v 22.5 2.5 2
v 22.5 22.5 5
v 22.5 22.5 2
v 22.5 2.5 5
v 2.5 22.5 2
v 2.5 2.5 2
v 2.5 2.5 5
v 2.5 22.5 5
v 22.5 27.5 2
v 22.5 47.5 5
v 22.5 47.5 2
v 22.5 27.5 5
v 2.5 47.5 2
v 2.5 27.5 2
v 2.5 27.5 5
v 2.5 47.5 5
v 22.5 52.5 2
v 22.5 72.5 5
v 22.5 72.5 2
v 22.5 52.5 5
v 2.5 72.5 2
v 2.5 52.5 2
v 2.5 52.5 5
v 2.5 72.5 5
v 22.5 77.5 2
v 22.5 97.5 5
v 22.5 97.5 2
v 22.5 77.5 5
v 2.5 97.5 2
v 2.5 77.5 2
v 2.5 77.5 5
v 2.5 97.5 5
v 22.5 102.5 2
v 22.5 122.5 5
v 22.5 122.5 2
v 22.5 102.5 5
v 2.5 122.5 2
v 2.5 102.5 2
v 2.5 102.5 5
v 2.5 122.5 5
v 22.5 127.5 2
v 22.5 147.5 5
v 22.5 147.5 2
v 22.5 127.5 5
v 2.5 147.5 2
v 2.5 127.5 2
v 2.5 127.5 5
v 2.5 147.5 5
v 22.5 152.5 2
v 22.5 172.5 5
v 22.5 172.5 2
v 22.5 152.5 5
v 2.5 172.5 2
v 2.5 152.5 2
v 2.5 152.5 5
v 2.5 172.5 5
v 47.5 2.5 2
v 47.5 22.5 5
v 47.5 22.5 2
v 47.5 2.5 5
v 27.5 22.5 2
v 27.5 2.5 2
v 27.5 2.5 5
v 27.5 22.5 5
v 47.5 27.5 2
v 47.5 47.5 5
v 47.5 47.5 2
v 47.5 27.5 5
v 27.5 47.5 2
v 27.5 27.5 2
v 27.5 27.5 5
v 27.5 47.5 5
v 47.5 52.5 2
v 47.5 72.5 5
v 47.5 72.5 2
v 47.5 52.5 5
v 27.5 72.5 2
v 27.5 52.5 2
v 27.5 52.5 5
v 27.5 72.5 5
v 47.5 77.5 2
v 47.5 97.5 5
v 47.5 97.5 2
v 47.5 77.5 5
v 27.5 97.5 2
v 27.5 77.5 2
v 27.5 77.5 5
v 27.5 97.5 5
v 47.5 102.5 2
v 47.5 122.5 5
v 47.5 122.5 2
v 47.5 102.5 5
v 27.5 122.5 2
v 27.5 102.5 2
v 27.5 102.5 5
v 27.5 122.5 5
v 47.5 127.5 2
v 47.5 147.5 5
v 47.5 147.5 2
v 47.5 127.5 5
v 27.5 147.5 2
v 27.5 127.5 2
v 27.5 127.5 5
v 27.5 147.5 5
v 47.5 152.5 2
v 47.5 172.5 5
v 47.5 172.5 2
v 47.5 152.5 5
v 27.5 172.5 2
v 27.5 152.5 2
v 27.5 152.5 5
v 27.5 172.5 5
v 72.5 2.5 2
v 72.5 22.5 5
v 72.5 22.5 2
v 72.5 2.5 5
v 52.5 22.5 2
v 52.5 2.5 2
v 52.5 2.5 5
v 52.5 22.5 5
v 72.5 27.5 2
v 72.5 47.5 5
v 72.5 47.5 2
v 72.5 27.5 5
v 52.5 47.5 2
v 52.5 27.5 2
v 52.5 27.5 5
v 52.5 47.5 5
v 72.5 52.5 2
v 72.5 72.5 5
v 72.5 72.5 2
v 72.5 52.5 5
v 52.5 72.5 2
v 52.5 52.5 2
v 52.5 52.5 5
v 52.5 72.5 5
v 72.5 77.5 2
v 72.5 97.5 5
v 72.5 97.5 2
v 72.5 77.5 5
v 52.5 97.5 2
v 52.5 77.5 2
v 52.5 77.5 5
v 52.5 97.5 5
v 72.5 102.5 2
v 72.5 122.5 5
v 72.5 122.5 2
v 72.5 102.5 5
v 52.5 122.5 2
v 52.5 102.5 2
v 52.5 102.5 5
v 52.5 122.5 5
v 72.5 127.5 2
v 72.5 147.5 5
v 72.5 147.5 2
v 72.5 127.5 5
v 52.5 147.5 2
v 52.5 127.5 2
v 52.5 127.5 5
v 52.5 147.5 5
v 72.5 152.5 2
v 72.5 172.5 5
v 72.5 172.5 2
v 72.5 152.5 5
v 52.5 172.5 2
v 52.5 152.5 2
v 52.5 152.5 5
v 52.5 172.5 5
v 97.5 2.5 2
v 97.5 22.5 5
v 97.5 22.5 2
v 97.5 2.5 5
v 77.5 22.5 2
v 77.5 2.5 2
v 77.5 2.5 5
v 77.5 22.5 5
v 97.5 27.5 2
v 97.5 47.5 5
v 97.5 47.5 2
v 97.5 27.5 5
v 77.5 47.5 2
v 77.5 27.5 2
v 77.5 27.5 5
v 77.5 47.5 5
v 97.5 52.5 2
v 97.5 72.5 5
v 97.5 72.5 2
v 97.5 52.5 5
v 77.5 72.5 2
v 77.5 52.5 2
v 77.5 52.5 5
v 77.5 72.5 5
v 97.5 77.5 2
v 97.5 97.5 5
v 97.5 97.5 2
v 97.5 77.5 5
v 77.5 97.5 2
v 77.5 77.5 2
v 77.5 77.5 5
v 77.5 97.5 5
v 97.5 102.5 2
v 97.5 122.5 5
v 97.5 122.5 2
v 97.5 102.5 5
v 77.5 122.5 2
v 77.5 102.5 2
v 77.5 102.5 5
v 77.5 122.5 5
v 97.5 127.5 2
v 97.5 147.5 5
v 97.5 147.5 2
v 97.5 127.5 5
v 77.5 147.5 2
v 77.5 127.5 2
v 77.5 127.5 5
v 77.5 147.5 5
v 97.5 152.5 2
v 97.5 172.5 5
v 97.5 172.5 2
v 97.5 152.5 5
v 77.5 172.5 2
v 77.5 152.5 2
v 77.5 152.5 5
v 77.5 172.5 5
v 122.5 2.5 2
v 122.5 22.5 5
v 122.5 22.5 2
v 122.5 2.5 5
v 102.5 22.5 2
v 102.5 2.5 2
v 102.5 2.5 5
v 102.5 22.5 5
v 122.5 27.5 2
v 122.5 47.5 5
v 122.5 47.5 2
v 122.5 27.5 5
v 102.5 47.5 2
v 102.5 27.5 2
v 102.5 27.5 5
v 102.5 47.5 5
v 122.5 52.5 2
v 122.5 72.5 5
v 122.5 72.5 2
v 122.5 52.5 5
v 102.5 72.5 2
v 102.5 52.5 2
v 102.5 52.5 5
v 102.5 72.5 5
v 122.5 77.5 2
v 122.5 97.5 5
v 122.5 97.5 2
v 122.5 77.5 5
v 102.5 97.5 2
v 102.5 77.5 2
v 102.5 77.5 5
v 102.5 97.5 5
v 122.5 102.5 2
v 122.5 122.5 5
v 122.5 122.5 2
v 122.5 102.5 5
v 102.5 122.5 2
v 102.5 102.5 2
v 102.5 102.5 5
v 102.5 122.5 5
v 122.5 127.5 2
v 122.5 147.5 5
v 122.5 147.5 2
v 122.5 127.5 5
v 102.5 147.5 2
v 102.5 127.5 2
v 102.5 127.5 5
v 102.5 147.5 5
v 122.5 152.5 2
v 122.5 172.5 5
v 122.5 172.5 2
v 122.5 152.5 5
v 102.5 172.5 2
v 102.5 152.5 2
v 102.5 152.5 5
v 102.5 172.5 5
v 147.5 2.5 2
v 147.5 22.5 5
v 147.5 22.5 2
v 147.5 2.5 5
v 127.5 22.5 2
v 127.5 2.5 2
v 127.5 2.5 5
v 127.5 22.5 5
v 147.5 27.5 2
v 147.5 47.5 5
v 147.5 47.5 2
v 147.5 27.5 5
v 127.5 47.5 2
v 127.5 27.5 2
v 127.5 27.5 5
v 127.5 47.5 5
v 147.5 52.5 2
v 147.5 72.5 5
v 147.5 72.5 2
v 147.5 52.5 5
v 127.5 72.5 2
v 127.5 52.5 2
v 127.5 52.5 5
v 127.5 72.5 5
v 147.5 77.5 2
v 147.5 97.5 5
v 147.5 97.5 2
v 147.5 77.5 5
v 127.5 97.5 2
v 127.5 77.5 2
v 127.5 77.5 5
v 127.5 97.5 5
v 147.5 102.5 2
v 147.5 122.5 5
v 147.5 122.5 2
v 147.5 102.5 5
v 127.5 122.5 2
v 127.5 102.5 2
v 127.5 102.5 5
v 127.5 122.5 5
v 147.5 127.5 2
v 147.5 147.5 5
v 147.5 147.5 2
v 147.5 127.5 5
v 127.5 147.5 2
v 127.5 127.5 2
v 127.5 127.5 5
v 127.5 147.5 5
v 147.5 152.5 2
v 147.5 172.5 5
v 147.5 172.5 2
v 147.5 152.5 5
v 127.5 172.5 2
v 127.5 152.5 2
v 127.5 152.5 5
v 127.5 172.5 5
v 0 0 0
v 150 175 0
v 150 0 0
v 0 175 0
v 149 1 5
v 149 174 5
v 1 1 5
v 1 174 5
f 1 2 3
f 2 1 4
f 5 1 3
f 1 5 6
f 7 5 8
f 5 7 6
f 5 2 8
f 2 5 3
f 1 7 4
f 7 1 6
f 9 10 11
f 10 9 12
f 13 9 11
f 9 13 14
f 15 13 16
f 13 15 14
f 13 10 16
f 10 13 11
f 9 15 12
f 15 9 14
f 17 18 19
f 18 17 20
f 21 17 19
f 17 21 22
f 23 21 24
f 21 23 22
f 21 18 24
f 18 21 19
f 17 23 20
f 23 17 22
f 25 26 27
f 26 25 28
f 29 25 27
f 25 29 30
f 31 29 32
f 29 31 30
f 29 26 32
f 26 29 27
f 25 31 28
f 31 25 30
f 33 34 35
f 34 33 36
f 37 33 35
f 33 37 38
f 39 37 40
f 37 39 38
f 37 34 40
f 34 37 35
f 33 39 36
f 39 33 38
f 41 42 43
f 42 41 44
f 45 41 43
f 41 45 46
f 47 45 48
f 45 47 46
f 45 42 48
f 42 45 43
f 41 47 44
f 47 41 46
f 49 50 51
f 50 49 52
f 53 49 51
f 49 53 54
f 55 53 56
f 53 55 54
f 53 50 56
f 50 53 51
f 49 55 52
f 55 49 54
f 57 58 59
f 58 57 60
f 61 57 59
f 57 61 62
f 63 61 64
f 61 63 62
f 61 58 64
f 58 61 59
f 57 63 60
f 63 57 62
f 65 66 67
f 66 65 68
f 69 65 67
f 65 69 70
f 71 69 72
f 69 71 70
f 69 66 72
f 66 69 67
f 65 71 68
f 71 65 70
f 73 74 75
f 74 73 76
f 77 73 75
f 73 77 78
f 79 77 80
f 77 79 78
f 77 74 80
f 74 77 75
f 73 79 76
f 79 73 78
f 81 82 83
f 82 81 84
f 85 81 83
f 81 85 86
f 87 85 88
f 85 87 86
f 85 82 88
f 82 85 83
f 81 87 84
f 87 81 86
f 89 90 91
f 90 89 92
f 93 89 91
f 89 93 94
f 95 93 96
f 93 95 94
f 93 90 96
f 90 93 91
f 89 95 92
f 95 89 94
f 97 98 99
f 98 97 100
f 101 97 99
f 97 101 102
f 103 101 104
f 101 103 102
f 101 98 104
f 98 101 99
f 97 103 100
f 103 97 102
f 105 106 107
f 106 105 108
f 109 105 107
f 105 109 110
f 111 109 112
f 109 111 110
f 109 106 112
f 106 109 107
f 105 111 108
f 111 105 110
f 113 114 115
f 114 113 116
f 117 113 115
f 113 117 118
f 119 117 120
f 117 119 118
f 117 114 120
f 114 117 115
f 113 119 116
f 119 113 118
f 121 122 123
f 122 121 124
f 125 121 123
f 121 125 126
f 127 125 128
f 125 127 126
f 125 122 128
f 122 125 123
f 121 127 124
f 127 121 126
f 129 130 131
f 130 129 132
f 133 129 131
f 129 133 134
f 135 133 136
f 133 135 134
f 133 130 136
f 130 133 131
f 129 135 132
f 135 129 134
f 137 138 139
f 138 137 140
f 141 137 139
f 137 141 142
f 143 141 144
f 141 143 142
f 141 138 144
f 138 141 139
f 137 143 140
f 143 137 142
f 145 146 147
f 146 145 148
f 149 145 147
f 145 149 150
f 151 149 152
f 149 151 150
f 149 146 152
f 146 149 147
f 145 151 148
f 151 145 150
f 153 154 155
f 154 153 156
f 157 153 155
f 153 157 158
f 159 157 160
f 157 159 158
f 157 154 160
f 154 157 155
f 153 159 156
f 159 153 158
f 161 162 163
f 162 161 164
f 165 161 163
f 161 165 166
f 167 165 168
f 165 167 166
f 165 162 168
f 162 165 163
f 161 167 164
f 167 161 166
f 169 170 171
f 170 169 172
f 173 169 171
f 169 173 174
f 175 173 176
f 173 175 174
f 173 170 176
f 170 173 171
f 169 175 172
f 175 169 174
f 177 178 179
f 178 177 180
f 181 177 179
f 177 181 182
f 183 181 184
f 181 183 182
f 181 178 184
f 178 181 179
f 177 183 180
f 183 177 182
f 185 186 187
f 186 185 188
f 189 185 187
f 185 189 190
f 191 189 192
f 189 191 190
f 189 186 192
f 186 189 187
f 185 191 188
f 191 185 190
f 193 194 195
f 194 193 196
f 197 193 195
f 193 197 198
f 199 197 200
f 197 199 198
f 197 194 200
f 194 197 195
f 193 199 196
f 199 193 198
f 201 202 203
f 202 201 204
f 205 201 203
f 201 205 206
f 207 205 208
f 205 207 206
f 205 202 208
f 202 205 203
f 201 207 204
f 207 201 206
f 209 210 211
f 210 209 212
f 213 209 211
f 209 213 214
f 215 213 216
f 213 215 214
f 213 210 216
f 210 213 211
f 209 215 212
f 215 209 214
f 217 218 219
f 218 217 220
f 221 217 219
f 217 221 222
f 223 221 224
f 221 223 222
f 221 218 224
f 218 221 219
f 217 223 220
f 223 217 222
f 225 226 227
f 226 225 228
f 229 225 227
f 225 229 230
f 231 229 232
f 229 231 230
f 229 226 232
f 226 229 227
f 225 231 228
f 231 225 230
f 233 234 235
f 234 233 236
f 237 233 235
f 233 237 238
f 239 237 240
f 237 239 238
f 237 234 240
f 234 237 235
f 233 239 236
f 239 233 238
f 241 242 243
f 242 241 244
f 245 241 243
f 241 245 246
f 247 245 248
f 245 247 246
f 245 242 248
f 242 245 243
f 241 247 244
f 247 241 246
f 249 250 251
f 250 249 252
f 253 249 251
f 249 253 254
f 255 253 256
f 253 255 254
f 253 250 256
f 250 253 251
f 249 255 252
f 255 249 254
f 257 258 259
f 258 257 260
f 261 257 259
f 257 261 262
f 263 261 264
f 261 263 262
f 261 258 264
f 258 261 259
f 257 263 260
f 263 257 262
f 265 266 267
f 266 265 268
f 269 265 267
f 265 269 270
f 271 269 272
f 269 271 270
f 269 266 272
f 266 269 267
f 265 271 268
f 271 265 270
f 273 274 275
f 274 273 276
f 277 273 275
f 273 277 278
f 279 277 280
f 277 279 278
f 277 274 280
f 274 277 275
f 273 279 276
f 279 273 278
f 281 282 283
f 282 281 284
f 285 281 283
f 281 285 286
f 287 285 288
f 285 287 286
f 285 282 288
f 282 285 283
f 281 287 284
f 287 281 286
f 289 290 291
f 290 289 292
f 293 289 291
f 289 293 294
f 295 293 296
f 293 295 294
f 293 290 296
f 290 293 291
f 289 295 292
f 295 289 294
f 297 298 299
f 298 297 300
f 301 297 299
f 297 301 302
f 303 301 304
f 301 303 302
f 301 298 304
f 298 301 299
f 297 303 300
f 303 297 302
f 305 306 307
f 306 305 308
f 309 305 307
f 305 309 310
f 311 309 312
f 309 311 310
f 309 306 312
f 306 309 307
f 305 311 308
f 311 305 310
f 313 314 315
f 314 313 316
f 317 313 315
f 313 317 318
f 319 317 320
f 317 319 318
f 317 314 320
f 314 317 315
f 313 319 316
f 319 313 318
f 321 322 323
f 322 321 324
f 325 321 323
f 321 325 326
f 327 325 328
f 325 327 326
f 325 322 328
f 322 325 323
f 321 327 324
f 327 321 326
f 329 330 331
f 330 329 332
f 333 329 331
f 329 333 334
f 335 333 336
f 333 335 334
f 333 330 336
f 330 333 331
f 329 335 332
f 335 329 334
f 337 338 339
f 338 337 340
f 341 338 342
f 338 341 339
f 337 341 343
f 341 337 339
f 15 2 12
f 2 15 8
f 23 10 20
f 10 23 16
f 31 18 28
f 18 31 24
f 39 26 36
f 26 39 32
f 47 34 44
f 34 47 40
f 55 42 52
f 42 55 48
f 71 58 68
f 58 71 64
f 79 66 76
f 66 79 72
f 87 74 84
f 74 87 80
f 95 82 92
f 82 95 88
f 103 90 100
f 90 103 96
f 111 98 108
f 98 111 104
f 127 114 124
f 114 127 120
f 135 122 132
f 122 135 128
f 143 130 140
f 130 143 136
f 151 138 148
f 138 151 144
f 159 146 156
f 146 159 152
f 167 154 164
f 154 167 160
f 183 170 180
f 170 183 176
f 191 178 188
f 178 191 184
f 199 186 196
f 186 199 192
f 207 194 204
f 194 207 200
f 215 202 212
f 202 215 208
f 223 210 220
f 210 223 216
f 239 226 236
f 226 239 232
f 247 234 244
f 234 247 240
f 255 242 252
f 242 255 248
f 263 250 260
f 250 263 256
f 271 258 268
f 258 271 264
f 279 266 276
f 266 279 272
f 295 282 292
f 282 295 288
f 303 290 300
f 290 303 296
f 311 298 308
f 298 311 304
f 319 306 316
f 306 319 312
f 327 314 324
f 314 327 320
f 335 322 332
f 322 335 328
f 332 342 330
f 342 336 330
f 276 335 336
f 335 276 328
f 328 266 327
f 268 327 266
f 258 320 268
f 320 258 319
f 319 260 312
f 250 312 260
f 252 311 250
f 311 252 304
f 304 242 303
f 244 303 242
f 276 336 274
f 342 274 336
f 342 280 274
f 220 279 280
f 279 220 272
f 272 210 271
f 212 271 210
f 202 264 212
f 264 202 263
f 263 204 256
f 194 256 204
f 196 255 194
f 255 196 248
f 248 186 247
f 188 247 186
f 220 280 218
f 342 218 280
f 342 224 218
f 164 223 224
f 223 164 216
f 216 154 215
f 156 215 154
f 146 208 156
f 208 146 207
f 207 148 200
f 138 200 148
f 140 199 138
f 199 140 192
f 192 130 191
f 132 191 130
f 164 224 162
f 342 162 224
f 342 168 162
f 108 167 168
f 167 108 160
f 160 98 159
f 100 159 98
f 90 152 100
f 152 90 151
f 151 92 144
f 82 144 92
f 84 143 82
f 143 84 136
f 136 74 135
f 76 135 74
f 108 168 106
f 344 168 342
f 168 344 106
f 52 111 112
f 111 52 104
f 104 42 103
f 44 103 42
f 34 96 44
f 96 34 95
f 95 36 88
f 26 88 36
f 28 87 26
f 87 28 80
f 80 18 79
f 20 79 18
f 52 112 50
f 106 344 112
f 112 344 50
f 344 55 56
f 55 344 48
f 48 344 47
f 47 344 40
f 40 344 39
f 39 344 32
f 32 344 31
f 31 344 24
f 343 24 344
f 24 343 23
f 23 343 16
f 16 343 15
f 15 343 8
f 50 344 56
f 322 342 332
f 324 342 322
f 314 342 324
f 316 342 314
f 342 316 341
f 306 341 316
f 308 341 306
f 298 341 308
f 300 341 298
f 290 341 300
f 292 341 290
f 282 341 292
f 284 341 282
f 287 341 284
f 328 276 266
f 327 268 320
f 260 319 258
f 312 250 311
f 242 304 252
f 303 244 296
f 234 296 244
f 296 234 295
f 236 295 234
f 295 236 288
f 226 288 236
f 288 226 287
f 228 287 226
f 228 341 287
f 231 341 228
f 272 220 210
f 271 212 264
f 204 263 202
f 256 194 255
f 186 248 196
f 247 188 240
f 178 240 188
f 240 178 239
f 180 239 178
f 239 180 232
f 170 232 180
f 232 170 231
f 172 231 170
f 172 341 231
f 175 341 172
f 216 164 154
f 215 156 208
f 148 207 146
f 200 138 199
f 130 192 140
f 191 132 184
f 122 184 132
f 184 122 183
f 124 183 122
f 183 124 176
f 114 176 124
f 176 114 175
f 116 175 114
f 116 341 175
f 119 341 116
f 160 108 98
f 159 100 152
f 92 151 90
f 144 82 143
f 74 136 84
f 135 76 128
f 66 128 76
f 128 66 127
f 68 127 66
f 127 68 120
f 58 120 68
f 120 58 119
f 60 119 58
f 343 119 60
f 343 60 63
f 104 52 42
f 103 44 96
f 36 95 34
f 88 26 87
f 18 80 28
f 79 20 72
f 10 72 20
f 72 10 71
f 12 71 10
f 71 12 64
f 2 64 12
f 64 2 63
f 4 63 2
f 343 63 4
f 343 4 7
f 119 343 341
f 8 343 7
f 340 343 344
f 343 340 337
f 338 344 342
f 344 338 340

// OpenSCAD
//Number of columns for this tray
cols = 6;
//Number of rows for this tray
rows = 7;
//heigh (thickness) of this tray
height = 5;
// square base size 
base_size = 25;
// square base size of adapted models
adapted_base_size = 20;
//minimum bottom height (thickness) of the insets for the bases
height_offset = 2;
//Inset of the top of the tray: greater the value greater the slope of the tray
inset = 1;
//if base adapted are round (in this case adapted_base_size is considered as the diameter of the round base)
isRound_adapted = false;

module tray(cols, rows, height, base_size, adapted_base_size, inset) {
    
    b_total_cols = base_size * cols;
    b_total_rows = base_size * rows;
    
    t_total_cols = base_size * cols - inset *2;
    t_total_rows = base_size * rows - inset *2;
    
 
    polyhedron(
        points=[
                [0,0,0],                        //base bottom left
                [b_total_cols,0,0],             //base bottom right
                [b_total_cols,b_total_rows,0],  //base top right
                [0,b_total_rows,0],             //base top left
    
                [inset,  inset,   height],                              //surface bottom left
                [inset + t_total_cols, inset,  height],                 //surface bottom right
                [inset + t_total_cols, inset + t_total_rows, height],   //surface top right
                [inset,   inset + t_total_rows,  height]                //surface top left
            ],
        faces =[
                    [0,1,2,3],
                    [4,5,1,0],
                    [5,6,2,1],
                    [6,7,3,2],
                    [7,4,0,3],
                    [7,6,5,4]
                ]
    );
        

   
}

module adapted_base_holes(cols, rows, height_offset, base_size, adapted_base_size,isRound_adapted) {
    
    gap = base_size - adapted_base_size;
    echo(gap)
    for (c = [0:cols-1]){
        for (r = [0:rows-1]){
            translate( 
                        [gap/2 + (c*adapted_base_size) + (c*gap), //row
                        gap/2 + (r*adapted_base_size) + (r*gap), //col
                        height_offset]
            )                       
            cube(size = adapted_base_size);            
        }
    }
}

module adapted_base_holes_round(cols, rows, height_offset, base_size, adapted_base_size) {
    
    gap = base_size - adapted_base_size;
    echo(gap)
    for (c = [0:cols-1]){
        for (r = [0:rows-1]){
            translate( 
                        [base_size/2 + base_size * c , //row
                        base_size/2 + base_size * r, //col
                        height_offset]
            )
            cylinder(r = adapted_base_size/2, h = height);
        }
    }
}

difference(){
    tray(cols, rows, height, base_size, adapted_base_size, inset);
    
    if(!isRound_adapted){
        adapted_base_holes(cols, rows, height_offset, base_size, adapted_base_size, isRound_adapted);
    }else{
        adapted_base_holes_round(cols, rows, height_offset, base_size, adapted_base_size, isRound_adapted);
    }
}
